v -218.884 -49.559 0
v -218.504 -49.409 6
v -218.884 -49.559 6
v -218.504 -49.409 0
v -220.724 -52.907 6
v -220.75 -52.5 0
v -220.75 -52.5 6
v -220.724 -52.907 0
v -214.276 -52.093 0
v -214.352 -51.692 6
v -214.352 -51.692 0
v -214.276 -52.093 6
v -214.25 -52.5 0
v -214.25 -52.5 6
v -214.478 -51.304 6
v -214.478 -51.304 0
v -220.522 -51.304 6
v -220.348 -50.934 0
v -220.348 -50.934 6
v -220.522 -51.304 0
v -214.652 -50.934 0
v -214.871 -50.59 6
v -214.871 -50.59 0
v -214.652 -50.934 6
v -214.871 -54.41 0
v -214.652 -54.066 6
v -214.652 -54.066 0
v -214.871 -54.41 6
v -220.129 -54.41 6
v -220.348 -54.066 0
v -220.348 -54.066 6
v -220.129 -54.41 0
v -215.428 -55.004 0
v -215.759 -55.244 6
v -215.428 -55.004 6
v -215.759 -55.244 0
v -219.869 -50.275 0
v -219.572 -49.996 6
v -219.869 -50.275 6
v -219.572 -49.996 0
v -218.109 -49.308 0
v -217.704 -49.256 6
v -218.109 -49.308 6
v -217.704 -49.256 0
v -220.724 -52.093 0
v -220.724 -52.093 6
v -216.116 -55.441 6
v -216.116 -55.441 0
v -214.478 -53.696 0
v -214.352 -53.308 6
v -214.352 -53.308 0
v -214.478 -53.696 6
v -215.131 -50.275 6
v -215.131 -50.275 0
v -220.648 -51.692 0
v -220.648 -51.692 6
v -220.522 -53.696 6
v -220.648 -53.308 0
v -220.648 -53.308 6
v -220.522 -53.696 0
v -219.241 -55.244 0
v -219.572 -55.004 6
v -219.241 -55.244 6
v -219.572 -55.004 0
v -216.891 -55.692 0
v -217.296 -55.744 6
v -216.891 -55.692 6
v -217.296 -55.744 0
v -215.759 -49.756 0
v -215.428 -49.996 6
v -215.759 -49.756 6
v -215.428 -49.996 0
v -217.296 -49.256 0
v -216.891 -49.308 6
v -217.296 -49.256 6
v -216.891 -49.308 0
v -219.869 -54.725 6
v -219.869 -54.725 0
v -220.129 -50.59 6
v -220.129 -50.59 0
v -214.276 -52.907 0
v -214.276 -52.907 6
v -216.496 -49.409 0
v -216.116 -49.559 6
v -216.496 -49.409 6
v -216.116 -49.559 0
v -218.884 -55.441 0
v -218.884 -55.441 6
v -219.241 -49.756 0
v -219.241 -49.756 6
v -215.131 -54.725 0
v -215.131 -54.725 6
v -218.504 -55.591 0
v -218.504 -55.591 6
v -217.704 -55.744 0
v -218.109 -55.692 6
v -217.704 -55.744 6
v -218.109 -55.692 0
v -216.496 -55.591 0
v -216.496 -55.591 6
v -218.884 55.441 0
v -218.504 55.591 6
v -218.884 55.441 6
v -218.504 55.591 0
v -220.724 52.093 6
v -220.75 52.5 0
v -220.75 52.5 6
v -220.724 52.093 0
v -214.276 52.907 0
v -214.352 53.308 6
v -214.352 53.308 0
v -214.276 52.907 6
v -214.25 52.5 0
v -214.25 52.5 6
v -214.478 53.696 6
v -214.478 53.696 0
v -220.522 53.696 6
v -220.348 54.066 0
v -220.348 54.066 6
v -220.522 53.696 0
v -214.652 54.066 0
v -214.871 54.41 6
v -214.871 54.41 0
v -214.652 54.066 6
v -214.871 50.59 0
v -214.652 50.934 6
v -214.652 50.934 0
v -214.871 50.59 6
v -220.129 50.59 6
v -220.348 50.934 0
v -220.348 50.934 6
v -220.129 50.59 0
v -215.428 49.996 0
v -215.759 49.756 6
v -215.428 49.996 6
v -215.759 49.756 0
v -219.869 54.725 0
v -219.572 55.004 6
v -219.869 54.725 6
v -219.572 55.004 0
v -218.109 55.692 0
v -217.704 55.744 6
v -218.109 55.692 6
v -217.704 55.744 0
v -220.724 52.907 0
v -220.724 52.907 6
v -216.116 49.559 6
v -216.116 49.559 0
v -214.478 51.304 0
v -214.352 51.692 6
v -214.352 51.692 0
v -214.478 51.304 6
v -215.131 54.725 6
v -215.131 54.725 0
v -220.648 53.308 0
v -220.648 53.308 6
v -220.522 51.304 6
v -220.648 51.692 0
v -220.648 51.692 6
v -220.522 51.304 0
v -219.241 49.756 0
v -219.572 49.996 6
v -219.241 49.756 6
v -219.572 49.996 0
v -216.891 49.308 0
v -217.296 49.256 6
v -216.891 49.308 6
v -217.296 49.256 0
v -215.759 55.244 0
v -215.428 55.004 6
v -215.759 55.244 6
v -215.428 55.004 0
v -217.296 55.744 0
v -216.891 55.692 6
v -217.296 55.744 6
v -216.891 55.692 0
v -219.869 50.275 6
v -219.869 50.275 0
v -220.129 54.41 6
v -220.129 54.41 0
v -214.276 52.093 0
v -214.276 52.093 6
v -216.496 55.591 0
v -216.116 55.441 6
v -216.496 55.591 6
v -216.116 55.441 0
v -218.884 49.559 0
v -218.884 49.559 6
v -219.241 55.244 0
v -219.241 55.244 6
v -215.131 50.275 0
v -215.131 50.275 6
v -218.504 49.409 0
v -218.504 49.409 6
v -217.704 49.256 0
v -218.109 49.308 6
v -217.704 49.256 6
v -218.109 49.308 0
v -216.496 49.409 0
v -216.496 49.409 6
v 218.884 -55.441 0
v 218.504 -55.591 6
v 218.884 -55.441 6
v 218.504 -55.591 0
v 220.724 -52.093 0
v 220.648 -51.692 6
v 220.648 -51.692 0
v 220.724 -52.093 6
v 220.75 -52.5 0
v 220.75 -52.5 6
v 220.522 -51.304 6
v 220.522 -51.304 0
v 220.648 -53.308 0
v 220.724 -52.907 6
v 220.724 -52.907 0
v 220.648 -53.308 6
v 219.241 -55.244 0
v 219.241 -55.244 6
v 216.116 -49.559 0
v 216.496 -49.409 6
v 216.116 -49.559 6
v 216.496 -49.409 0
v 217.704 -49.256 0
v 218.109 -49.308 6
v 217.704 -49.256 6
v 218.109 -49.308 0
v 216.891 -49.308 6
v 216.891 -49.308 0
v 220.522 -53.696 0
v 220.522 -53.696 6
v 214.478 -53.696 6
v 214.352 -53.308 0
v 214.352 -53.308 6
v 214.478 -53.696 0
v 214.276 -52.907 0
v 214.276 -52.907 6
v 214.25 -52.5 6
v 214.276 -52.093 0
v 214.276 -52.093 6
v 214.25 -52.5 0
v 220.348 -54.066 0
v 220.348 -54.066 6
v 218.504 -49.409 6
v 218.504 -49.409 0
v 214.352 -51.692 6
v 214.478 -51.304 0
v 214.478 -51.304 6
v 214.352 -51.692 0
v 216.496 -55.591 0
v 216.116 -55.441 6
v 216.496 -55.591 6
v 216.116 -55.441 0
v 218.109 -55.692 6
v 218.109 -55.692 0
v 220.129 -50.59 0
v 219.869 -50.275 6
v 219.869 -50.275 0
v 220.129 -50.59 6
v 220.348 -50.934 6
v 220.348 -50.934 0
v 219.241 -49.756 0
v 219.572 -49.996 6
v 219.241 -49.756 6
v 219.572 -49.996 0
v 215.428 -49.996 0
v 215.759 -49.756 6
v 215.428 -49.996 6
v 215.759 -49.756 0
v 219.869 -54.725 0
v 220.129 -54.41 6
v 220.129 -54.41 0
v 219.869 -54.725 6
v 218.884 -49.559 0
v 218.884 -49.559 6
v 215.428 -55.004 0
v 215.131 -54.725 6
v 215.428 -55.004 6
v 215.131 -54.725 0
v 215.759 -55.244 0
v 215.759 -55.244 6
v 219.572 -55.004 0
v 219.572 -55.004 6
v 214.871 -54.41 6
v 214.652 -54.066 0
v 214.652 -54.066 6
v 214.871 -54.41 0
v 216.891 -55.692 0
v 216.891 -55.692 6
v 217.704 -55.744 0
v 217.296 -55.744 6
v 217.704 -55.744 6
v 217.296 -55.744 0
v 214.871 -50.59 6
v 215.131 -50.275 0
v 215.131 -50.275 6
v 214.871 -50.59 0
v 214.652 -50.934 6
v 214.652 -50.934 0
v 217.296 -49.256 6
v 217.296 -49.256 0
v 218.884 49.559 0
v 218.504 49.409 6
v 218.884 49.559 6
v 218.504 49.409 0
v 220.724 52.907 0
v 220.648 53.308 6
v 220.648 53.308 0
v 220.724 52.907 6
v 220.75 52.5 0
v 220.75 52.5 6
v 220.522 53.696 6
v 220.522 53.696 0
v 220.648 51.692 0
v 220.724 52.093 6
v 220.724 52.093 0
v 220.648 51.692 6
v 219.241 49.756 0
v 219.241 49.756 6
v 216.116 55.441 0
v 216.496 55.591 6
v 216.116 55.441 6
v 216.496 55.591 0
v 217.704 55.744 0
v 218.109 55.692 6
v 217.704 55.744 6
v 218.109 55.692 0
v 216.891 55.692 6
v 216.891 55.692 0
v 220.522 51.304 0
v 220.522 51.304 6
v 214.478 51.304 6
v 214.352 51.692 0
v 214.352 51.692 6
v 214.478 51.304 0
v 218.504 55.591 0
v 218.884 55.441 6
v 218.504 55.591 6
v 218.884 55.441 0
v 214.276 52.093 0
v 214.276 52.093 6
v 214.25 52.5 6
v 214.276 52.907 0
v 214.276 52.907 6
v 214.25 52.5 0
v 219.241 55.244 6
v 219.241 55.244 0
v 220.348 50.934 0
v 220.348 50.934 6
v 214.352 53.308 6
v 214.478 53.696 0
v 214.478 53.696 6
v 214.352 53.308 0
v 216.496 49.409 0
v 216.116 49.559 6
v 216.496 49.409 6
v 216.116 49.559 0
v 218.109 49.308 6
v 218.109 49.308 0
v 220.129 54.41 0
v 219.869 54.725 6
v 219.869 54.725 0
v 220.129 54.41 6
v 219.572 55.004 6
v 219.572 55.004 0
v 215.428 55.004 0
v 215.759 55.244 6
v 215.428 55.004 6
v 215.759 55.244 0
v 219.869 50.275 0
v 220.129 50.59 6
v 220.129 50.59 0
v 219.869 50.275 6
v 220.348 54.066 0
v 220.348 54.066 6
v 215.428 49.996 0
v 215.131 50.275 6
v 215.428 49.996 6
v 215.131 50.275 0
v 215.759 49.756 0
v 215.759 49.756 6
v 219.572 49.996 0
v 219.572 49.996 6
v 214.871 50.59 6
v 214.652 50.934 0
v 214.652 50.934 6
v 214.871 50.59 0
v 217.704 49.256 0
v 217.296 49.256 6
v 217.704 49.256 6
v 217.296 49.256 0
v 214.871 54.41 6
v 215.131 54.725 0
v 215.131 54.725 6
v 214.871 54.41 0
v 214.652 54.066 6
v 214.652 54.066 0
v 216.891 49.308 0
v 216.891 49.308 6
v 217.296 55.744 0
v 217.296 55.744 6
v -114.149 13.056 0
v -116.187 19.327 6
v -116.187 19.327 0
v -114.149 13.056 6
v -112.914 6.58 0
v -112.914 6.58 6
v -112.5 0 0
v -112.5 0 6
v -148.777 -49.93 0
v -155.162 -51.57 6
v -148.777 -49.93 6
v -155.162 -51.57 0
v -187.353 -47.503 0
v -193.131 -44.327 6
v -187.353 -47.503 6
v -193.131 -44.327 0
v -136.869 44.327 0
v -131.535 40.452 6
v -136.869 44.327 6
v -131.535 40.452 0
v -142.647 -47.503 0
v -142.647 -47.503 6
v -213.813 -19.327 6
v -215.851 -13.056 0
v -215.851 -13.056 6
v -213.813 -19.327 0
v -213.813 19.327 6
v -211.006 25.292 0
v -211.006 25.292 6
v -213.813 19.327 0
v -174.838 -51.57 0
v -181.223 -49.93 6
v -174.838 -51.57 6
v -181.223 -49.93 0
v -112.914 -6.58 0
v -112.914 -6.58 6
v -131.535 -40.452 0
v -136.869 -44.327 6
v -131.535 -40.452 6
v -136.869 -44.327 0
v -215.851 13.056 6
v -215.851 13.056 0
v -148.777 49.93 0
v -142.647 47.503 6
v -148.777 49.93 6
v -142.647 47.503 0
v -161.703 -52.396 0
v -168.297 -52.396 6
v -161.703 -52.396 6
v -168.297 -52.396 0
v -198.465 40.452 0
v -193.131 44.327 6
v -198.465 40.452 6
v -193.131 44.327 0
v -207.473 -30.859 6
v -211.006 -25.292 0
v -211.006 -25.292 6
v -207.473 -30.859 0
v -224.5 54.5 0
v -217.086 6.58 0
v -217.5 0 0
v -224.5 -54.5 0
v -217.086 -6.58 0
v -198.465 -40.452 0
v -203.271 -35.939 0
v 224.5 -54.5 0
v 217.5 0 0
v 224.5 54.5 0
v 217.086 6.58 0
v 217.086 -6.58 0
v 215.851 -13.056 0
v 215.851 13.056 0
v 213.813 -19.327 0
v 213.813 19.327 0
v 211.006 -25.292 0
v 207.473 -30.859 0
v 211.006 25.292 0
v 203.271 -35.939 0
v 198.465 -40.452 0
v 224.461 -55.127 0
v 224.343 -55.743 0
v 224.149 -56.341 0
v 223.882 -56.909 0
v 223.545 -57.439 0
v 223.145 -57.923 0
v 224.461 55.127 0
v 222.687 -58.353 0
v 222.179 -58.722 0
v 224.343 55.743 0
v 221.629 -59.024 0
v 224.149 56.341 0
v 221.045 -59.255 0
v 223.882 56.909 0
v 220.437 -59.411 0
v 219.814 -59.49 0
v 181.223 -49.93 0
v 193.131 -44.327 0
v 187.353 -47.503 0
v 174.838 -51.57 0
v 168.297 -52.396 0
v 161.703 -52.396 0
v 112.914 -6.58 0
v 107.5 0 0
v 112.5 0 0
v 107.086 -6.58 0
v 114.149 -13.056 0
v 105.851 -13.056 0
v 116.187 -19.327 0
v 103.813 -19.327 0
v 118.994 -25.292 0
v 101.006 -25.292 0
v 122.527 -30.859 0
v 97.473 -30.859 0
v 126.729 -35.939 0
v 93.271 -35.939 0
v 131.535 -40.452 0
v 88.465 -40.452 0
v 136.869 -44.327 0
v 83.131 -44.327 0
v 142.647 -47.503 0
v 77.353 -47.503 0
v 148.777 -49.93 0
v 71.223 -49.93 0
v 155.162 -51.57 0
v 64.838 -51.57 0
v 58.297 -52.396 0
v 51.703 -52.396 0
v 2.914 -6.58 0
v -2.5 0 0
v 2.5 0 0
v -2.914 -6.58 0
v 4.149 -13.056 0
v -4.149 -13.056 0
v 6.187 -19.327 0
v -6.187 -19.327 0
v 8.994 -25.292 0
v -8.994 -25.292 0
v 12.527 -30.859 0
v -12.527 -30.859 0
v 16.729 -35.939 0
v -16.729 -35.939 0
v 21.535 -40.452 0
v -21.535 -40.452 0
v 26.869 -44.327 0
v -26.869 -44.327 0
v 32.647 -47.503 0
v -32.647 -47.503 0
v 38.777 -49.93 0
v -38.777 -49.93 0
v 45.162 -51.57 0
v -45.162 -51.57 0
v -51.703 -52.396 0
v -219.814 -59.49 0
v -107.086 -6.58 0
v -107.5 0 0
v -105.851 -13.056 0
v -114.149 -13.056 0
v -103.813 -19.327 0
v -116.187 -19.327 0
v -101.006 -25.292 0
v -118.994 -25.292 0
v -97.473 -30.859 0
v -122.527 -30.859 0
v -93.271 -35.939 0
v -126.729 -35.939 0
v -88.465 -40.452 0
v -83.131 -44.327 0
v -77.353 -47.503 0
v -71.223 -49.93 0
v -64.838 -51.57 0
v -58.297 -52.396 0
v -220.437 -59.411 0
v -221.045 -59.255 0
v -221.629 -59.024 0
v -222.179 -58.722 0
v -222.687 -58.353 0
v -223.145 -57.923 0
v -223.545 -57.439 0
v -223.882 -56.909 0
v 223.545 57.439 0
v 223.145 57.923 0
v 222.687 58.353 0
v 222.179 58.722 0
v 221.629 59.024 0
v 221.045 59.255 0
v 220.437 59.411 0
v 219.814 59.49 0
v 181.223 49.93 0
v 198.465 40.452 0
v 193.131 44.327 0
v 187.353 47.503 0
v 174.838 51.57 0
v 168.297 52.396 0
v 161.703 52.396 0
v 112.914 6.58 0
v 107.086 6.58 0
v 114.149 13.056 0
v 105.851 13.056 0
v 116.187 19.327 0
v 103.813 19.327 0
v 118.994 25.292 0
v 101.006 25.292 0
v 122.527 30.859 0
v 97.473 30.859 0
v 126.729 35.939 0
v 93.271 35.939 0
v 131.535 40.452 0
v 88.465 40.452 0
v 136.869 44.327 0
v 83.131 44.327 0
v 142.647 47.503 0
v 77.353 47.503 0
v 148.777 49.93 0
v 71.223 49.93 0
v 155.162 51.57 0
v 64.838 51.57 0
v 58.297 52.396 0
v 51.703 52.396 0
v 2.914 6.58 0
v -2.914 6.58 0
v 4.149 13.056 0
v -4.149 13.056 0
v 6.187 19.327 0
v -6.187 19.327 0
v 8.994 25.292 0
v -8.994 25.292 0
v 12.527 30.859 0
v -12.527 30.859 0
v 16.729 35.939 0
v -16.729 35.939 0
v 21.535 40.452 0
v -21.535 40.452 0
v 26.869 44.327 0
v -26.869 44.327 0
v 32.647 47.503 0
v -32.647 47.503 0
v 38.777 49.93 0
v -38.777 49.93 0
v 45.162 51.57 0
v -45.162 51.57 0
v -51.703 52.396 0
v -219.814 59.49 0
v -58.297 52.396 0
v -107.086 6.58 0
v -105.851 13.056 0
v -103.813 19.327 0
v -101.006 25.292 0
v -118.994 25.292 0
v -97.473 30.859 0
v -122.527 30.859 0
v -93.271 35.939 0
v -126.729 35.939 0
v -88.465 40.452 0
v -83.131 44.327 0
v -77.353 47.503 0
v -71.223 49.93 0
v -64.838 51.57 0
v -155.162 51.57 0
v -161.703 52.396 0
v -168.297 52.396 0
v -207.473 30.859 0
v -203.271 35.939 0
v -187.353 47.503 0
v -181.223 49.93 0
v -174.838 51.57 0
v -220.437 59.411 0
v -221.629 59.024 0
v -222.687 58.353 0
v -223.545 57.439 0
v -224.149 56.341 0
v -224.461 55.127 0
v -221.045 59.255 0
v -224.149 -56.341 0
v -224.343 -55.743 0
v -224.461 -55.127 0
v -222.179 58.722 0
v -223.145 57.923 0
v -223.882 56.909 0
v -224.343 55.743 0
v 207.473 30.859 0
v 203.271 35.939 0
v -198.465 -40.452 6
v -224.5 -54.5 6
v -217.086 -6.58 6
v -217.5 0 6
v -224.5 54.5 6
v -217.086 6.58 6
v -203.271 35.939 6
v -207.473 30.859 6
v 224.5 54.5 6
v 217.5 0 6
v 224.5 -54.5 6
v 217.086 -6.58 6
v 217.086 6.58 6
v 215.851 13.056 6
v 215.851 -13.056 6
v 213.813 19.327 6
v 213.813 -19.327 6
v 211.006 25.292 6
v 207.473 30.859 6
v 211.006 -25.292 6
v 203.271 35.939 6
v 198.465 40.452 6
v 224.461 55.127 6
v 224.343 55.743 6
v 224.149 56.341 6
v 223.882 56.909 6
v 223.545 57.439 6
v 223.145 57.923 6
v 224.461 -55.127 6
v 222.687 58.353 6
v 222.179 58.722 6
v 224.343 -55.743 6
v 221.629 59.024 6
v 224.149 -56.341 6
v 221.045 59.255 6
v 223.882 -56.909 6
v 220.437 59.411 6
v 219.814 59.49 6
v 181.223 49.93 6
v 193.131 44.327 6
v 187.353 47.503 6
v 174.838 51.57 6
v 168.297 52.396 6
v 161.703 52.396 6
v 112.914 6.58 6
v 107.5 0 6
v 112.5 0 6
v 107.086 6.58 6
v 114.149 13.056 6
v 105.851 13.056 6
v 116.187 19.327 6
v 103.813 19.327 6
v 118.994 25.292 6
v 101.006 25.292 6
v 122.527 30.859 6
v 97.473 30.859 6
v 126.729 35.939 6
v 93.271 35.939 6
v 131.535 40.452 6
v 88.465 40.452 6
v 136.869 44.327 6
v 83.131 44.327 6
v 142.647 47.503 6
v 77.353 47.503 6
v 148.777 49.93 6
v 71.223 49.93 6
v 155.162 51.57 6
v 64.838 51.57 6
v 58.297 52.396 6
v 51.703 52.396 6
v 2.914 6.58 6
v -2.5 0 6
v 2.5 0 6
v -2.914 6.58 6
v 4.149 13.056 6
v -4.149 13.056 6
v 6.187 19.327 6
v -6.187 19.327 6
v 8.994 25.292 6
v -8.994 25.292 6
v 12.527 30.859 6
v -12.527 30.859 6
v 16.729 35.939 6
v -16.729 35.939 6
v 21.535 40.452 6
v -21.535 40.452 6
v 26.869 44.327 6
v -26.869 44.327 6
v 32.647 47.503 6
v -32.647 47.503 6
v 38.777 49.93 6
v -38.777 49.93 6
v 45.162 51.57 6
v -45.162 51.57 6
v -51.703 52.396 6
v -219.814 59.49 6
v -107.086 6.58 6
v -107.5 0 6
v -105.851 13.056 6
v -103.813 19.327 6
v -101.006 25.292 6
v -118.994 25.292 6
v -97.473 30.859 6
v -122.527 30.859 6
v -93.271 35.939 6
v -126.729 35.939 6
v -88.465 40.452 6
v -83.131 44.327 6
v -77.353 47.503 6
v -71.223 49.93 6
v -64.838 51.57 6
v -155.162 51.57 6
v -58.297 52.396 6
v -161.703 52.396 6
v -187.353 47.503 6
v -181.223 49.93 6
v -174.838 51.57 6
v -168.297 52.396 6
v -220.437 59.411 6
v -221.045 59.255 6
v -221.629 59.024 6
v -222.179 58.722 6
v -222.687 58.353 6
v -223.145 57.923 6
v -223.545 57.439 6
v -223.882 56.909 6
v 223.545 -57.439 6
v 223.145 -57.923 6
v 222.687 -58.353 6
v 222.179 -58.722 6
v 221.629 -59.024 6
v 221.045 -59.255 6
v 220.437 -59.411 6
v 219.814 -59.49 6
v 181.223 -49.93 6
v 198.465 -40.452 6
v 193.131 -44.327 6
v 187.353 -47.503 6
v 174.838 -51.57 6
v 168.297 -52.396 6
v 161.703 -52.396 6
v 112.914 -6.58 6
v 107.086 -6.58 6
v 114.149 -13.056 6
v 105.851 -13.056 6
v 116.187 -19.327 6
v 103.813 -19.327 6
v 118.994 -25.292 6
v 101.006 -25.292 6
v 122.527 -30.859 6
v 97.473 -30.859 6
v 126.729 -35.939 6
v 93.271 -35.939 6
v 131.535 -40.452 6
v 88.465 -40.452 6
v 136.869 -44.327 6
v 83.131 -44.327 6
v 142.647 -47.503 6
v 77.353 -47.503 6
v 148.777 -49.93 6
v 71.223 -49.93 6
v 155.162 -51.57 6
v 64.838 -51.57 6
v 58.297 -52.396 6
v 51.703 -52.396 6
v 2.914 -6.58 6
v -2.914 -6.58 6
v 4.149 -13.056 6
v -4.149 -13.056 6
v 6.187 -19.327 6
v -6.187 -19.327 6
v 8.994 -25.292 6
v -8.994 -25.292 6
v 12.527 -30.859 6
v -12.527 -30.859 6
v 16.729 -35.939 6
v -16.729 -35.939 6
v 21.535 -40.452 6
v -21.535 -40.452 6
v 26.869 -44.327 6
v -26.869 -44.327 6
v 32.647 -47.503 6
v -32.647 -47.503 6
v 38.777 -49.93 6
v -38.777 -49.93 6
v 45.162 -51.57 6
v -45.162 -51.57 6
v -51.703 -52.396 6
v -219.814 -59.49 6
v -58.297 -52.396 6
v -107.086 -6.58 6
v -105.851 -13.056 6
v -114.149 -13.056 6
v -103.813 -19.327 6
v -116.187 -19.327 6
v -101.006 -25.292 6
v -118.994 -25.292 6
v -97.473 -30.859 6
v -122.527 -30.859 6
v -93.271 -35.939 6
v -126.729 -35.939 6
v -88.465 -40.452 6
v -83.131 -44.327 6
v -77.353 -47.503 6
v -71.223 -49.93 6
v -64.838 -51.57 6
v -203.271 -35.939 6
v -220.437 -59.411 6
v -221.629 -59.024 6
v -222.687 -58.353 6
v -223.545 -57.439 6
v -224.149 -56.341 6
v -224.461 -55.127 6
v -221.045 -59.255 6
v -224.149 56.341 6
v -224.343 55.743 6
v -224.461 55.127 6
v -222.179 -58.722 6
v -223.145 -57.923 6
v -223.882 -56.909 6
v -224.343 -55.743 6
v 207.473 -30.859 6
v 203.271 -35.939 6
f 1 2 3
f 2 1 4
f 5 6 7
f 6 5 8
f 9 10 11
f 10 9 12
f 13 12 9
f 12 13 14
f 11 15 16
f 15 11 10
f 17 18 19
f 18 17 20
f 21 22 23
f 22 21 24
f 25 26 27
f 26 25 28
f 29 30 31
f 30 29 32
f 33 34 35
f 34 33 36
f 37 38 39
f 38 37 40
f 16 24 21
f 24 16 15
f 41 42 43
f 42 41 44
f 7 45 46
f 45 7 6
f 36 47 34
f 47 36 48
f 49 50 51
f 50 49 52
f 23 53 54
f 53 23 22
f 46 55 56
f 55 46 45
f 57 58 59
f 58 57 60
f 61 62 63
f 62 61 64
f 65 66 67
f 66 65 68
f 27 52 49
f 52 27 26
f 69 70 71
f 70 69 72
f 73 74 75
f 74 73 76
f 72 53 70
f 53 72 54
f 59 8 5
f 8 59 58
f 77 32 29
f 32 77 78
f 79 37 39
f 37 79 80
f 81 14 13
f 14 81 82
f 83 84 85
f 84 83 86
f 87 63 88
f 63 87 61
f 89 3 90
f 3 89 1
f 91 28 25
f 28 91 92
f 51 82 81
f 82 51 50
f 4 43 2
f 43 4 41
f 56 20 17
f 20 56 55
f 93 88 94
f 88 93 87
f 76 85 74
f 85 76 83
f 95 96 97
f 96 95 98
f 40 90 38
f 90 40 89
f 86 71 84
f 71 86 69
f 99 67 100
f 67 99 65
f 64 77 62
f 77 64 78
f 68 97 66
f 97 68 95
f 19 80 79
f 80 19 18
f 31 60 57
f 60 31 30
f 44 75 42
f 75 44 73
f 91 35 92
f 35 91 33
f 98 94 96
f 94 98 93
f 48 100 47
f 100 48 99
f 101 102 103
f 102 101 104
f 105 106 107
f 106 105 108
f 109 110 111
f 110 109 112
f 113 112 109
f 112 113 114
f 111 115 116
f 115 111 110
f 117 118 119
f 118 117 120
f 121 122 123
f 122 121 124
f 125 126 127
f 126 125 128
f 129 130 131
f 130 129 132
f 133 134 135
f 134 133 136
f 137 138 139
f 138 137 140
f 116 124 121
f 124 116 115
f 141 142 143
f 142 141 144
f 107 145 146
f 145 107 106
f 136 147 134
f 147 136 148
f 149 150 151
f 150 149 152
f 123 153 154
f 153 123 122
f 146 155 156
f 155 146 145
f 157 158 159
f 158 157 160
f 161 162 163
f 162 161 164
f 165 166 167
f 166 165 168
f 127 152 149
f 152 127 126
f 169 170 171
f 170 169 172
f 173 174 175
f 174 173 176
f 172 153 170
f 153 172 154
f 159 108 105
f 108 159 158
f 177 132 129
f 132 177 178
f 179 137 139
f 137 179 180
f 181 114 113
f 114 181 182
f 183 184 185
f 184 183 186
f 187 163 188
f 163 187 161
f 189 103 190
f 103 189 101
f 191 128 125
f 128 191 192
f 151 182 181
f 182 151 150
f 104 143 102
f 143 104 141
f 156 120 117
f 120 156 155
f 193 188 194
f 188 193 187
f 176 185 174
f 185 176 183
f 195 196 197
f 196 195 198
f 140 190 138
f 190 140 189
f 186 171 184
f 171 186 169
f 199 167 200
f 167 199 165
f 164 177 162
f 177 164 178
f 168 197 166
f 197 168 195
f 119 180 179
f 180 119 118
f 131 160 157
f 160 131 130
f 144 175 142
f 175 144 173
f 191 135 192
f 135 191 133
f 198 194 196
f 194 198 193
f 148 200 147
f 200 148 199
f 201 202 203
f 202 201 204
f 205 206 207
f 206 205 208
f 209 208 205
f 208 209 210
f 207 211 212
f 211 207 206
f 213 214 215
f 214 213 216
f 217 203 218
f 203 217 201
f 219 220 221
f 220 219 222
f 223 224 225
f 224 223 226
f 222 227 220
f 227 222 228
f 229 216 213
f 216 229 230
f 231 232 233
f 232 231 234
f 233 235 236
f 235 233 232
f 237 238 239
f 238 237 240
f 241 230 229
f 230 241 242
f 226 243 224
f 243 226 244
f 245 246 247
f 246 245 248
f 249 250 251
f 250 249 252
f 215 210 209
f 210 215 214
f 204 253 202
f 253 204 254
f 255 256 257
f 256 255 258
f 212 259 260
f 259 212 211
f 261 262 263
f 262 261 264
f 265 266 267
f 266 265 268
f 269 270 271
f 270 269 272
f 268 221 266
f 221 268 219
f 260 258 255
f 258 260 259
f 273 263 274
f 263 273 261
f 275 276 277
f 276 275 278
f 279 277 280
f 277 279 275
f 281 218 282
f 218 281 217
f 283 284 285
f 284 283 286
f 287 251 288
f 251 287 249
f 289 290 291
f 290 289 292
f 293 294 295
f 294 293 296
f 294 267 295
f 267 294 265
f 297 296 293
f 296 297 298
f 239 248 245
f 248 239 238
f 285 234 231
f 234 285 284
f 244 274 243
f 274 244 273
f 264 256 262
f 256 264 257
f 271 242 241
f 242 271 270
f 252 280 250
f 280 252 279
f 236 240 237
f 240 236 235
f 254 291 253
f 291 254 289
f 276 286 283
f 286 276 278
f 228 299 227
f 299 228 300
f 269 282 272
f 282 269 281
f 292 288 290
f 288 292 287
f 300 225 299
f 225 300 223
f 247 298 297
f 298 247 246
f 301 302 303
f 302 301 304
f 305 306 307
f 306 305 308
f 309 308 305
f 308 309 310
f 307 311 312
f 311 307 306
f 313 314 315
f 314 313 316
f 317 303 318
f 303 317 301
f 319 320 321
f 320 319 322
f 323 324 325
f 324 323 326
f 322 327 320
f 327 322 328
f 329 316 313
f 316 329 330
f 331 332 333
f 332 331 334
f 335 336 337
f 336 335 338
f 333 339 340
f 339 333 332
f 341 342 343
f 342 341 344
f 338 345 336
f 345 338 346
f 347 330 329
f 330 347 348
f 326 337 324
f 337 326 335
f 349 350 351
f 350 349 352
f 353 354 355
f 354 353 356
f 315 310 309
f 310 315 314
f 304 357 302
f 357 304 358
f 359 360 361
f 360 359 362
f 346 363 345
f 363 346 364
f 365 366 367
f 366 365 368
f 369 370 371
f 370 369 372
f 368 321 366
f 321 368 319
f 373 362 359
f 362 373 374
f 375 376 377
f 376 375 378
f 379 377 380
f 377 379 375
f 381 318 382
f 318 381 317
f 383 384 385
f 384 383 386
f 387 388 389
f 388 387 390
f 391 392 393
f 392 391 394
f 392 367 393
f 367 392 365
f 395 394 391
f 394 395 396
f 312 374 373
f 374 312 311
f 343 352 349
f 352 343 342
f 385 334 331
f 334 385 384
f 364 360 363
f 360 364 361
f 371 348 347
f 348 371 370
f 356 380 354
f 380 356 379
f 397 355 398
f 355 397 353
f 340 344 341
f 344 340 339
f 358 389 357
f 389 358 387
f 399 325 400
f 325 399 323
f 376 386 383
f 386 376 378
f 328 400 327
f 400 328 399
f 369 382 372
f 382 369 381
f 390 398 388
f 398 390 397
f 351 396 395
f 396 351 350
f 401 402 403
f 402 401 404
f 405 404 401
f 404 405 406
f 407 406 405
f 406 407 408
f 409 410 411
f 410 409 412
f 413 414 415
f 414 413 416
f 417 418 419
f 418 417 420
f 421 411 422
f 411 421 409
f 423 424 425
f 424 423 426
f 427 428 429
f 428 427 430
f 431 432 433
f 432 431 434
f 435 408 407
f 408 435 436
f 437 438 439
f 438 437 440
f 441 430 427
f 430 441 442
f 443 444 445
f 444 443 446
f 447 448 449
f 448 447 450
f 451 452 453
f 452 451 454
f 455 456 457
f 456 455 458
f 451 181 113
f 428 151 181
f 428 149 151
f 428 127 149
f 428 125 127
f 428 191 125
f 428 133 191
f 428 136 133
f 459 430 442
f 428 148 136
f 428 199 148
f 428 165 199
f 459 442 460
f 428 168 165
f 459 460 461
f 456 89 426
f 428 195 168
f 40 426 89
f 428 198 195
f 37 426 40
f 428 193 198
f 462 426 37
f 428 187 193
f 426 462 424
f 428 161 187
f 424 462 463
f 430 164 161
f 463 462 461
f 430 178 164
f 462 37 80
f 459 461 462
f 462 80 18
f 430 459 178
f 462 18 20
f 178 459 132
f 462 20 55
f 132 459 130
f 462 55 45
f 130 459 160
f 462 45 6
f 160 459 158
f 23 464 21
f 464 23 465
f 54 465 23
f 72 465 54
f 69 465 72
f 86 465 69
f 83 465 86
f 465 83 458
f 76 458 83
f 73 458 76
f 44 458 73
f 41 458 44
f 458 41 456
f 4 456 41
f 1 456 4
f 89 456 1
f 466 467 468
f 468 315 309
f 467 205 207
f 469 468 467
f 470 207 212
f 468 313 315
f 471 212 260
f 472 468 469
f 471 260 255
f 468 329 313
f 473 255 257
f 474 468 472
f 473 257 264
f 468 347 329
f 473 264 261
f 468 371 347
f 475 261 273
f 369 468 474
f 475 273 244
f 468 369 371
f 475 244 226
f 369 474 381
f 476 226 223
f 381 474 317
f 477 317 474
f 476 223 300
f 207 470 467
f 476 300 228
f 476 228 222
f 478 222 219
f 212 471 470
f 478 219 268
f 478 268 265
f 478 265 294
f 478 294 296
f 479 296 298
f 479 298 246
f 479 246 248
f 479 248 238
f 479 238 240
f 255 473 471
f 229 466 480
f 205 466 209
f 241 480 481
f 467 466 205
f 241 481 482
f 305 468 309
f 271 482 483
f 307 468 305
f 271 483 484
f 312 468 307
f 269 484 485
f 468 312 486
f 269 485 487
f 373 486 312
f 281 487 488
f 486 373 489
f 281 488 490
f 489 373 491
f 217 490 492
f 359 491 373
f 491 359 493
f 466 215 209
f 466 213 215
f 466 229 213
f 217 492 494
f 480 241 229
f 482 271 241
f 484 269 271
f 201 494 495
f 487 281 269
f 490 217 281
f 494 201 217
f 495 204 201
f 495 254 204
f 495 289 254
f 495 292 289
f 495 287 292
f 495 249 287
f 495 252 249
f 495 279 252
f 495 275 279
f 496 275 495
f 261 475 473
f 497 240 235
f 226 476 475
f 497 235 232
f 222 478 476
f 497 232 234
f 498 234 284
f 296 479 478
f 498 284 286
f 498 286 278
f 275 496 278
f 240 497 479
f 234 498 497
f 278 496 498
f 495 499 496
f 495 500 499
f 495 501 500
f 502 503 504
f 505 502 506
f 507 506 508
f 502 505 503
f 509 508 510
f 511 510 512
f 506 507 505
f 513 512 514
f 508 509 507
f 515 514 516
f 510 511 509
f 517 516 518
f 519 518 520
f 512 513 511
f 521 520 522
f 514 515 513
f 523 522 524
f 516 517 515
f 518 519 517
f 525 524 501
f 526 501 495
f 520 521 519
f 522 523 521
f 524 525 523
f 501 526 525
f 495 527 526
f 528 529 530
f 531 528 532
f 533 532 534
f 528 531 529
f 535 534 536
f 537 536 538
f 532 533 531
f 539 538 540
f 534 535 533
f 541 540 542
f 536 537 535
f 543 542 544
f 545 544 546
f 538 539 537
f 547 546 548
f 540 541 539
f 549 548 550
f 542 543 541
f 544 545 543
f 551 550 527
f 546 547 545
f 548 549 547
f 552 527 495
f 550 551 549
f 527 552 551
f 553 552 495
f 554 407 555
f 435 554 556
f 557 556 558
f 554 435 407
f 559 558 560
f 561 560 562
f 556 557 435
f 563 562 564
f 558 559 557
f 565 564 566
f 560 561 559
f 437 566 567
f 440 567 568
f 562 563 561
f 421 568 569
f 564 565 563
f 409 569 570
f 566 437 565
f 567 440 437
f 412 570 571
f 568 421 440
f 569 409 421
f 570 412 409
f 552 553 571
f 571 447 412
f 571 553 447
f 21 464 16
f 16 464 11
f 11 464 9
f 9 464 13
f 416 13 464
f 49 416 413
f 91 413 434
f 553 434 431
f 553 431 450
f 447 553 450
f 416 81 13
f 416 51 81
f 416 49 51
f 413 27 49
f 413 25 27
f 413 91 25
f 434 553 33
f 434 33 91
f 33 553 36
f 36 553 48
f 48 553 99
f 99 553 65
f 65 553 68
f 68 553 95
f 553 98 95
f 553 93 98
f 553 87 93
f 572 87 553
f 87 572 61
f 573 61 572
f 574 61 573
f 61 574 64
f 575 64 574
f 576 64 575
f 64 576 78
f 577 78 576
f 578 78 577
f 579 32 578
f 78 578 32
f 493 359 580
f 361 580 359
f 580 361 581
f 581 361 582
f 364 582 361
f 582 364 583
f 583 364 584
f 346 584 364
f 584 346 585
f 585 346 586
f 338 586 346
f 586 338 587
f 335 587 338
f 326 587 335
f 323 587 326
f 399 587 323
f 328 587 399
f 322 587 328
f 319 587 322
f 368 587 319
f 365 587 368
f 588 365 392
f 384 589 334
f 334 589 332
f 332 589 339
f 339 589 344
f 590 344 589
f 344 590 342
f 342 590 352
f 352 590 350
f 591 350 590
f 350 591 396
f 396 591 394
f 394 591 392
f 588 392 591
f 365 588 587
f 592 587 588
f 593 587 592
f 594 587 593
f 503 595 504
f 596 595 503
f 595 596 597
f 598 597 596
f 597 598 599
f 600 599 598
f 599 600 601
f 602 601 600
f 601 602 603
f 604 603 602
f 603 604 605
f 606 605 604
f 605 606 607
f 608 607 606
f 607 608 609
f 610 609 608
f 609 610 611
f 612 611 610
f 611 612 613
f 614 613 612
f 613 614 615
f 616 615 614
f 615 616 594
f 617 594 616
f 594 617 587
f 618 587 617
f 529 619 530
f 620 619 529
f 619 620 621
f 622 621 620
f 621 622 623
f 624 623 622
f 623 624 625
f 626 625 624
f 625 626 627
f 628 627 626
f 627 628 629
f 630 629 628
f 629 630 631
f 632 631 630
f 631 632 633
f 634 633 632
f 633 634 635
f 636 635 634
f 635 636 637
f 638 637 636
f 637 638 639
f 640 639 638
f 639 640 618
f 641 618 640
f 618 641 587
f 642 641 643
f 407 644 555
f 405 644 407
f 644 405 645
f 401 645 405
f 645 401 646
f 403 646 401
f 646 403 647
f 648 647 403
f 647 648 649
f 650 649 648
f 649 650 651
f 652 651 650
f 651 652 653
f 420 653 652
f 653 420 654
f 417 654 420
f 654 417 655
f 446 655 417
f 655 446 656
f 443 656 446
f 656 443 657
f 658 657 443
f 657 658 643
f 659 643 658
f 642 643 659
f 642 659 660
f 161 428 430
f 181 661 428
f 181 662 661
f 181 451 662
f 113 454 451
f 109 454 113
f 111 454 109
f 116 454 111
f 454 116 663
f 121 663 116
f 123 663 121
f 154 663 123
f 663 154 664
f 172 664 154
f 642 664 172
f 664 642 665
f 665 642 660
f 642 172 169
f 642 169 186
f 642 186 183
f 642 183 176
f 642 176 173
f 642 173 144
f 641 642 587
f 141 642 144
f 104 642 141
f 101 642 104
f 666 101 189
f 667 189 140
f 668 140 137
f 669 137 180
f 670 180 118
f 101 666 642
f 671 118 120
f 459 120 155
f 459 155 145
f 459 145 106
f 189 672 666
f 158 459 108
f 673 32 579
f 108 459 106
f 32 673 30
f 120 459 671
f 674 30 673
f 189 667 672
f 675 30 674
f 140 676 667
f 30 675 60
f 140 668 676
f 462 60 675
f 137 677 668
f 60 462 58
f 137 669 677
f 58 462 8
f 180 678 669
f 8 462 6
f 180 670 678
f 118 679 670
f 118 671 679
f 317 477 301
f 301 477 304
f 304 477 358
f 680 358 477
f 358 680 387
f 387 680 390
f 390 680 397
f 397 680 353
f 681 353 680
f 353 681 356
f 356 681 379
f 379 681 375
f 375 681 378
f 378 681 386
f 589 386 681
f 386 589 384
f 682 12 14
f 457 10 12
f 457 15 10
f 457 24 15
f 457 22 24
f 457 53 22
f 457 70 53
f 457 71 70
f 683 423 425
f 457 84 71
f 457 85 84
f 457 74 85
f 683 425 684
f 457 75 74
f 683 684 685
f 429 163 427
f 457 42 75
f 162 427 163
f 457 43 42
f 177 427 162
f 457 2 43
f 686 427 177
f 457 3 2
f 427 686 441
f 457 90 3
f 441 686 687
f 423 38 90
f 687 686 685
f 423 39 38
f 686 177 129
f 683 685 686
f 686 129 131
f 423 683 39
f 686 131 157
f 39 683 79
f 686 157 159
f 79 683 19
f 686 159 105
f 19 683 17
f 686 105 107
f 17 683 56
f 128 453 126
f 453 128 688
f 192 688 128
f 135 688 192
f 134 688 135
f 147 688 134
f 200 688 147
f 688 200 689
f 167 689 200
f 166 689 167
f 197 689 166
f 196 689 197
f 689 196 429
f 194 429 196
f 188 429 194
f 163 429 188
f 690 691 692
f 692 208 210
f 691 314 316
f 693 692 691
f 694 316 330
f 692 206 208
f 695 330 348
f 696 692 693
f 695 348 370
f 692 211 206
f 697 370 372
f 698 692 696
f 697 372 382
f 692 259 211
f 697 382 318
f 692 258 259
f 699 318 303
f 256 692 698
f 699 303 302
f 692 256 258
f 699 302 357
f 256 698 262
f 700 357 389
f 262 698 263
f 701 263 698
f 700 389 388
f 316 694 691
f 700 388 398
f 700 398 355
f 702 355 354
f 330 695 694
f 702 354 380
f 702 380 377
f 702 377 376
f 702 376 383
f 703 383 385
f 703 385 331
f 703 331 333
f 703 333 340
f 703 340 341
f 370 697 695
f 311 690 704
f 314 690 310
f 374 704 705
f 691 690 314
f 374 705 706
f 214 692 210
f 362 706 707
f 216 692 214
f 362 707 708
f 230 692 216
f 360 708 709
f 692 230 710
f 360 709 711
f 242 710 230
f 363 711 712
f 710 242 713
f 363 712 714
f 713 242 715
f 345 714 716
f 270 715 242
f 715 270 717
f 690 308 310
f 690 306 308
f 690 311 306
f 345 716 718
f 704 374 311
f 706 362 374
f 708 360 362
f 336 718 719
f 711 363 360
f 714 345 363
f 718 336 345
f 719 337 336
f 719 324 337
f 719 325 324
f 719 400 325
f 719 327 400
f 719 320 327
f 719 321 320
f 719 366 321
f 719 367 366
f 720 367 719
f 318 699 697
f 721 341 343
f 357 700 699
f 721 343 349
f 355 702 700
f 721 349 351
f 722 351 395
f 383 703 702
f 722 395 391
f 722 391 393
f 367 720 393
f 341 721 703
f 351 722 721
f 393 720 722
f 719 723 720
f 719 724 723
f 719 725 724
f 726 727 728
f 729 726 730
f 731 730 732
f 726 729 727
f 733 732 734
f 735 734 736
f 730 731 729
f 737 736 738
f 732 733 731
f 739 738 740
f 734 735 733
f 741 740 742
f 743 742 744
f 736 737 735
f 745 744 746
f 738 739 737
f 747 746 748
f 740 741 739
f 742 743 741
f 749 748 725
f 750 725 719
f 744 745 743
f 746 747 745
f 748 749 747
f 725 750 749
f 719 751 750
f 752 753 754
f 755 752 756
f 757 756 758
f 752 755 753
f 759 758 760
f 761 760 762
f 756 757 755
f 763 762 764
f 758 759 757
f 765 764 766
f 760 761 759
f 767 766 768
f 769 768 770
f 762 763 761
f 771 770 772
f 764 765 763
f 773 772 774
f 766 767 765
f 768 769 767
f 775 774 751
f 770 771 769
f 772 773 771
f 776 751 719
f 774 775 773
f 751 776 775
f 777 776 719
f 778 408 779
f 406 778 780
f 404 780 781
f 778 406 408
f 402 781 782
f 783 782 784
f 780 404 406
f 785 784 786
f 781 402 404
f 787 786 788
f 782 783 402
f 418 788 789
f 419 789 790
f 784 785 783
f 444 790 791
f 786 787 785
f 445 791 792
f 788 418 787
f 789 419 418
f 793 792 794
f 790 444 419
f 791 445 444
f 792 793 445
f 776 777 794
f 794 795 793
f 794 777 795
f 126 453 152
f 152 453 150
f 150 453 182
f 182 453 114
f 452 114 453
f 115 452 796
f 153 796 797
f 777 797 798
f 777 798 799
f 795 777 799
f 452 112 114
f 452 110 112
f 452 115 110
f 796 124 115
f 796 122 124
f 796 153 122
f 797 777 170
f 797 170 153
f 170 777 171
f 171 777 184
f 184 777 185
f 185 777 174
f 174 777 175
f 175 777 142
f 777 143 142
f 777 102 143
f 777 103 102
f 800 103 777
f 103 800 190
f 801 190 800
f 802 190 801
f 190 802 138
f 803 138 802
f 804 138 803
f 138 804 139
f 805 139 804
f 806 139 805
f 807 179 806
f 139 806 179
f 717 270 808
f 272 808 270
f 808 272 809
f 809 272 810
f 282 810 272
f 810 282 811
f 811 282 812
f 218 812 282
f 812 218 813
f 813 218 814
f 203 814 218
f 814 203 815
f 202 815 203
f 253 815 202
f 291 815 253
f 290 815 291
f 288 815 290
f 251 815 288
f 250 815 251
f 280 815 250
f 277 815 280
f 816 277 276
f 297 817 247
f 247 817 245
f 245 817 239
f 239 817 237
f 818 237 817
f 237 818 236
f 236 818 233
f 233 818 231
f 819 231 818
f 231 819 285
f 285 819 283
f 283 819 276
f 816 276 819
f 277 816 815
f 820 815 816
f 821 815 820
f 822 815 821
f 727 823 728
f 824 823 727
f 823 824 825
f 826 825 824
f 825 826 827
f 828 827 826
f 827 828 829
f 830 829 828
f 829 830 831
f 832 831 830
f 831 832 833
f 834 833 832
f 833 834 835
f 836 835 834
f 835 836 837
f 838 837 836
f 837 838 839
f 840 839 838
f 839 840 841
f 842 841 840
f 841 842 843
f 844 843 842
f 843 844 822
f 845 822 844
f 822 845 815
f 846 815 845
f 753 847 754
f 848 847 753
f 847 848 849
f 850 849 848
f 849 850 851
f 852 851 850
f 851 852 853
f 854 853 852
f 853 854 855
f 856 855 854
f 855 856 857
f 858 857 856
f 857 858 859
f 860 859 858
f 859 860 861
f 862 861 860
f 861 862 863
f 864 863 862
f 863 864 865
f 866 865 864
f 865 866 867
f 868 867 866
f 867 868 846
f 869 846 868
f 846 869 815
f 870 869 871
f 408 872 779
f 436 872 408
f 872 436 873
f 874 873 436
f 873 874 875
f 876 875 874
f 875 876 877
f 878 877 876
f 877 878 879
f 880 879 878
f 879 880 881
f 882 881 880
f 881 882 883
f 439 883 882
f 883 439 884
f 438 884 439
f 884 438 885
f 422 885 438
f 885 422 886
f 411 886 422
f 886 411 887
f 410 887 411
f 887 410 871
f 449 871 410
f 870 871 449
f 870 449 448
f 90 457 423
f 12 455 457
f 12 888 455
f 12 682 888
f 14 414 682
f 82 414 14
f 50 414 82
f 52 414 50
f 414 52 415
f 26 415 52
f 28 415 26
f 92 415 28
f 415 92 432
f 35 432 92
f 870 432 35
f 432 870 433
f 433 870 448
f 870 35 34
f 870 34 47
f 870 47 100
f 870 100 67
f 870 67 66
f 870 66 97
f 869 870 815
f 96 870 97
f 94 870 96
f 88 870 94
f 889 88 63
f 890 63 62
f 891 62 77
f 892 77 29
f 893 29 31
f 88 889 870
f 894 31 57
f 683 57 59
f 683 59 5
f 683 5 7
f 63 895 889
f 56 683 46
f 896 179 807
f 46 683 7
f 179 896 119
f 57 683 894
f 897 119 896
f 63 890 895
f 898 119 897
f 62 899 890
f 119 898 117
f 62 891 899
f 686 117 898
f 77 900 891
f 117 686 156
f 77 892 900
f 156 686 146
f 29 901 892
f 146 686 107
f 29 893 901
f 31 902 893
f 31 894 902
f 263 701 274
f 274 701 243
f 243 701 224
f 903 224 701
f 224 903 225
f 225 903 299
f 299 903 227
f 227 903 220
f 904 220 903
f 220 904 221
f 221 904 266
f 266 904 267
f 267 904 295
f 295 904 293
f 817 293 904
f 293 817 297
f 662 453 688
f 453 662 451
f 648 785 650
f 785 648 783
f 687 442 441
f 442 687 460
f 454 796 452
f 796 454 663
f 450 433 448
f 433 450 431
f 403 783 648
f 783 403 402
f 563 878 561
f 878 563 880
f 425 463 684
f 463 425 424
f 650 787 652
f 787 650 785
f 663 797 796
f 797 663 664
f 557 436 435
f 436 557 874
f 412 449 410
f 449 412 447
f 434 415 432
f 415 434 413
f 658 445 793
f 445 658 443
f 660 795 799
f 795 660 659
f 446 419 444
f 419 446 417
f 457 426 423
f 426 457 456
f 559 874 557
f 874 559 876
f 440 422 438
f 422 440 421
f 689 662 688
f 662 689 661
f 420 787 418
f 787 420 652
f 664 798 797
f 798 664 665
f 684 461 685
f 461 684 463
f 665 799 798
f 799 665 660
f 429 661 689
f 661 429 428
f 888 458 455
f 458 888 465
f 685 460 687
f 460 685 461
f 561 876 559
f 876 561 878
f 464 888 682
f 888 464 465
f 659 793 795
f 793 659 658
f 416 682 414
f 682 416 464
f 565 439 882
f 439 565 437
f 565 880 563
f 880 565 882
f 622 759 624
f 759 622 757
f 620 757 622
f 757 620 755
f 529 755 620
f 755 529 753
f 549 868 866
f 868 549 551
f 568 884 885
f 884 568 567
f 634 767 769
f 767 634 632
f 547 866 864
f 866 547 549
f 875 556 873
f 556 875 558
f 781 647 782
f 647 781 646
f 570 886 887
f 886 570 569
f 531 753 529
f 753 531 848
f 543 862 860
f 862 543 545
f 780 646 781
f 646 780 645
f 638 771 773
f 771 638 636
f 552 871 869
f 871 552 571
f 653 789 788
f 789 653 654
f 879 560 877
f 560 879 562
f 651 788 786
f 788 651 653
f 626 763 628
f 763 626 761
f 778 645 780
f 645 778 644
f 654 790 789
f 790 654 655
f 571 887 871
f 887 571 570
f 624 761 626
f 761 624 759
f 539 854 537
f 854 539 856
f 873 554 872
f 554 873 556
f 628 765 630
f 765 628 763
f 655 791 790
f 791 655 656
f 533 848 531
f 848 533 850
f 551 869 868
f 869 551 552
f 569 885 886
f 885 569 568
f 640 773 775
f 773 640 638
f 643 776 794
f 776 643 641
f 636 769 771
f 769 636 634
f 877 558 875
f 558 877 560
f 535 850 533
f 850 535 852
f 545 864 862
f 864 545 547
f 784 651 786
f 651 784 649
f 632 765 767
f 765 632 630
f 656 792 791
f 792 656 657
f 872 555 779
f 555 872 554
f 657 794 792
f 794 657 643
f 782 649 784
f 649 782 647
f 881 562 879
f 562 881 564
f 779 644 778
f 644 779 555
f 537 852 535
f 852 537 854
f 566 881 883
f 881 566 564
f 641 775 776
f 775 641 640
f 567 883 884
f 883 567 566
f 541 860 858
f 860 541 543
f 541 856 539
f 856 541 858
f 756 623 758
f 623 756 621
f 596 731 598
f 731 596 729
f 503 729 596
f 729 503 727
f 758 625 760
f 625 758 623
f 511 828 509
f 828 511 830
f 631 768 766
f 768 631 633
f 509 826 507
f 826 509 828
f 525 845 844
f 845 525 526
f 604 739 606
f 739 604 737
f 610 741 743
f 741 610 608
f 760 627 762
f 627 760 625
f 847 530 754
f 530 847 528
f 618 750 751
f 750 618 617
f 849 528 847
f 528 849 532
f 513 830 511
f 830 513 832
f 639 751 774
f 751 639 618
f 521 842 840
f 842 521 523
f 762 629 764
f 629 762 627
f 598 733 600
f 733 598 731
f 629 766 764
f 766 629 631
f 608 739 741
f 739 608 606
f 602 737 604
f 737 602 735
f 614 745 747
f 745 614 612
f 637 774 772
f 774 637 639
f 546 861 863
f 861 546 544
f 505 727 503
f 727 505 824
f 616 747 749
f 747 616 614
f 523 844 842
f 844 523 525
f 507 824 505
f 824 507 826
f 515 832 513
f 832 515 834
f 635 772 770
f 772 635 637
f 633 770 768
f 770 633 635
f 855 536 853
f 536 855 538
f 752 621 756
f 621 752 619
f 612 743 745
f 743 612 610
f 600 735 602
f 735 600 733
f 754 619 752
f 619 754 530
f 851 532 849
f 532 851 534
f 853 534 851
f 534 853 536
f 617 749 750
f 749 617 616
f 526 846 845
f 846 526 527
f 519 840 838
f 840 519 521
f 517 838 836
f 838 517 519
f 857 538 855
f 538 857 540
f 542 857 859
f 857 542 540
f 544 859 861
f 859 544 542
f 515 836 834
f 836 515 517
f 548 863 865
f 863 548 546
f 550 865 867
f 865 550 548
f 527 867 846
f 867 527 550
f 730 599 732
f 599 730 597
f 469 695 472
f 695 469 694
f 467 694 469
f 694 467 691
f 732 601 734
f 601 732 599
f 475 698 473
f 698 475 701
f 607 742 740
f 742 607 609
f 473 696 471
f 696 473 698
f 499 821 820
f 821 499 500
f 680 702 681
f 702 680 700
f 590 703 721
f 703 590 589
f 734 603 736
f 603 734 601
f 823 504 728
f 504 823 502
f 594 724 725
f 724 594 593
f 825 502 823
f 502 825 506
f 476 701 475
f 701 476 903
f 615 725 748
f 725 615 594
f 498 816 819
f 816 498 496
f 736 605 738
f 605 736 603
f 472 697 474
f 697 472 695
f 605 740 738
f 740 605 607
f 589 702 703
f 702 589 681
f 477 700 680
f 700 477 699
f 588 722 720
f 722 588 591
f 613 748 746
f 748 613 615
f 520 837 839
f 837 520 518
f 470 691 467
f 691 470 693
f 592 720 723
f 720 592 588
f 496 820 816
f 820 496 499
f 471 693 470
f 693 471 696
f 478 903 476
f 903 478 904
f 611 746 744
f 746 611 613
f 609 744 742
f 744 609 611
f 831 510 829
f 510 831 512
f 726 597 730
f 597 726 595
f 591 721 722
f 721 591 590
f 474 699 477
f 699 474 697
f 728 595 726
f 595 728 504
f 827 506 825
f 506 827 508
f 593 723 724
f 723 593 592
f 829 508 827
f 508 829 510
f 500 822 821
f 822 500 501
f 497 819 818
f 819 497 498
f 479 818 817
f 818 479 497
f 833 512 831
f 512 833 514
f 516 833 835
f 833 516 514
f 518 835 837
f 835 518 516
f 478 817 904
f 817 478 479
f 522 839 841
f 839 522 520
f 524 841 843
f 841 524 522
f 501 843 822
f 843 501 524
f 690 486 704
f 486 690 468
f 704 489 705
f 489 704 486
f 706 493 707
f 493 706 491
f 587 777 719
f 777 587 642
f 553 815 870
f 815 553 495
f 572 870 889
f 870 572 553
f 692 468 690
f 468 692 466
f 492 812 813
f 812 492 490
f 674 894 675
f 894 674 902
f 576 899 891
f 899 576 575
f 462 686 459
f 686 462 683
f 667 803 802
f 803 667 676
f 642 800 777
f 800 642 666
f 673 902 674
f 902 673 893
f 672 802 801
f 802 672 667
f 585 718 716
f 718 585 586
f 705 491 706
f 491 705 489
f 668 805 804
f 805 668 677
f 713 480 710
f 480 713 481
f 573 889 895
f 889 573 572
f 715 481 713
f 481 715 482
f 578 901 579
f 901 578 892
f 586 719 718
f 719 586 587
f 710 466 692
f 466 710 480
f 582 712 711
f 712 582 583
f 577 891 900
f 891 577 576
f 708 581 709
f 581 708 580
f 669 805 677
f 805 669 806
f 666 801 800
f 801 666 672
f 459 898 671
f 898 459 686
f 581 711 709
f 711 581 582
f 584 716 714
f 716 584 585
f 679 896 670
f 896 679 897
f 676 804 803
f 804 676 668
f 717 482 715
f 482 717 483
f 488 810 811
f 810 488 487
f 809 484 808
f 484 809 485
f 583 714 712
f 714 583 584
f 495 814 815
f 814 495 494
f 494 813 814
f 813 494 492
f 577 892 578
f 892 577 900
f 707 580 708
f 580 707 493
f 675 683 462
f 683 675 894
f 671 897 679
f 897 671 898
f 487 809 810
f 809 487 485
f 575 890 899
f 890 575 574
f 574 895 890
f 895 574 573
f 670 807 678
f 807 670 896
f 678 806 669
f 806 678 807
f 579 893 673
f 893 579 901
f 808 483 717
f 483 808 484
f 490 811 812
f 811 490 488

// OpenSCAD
$fn = 50;


difference() {
	union() {
		hull() {
			translate(v = [-219.5000000000, 54.5000000000, 0]) {
				cylinder(h = 6, r = 5);
			}
			translate(v = [219.5000000000, 54.5000000000, 0]) {
				cylinder(h = 6, r = 5);
			}
			translate(v = [-219.5000000000, -54.5000000000, 0]) {
				cylinder(h = 6, r = 5);
			}
			translate(v = [219.5000000000, -54.5000000000, 0]) {
				cylinder(h = 6, r = 5);
			}
		}
	}
	union() {
		#translate(v = [-217.5000000000, -52.5000000000, -100.0000000000]) {
			cylinder(h = 200, r = 3.2500000000);
		}
		#translate(v = [-217.5000000000, 52.5000000000, -100.0000000000]) {
			cylinder(h = 200, r = 3.2500000000);
		}
		#translate(v = [217.5000000000, -52.5000000000, -100.0000000000]) {
			cylinder(h = 200, r = 3.2500000000);
		}
		#translate(v = [217.5000000000, 52.5000000000, -100.0000000000]) {
			cylinder(h = 200, r = 3.2500000000);
		}
		#translate(v = [-165.0000000000, 0, 0]) {
			cylinder(h = 6, r = 52.5000000000);
		}
		#translate(v = [-55.0000000000, 0, 0]) {
			cylinder(h = 6, r = 52.5000000000);
		}
		#translate(v = [55.0000000000, 0, 0]) {
			cylinder(h = 6, r = 52.5000000000);
		}
		#translate(v = [165.0000000000, 0, 0]) {
			cylinder(h = 6, r = 52.5000000000);
		}
	}
}
